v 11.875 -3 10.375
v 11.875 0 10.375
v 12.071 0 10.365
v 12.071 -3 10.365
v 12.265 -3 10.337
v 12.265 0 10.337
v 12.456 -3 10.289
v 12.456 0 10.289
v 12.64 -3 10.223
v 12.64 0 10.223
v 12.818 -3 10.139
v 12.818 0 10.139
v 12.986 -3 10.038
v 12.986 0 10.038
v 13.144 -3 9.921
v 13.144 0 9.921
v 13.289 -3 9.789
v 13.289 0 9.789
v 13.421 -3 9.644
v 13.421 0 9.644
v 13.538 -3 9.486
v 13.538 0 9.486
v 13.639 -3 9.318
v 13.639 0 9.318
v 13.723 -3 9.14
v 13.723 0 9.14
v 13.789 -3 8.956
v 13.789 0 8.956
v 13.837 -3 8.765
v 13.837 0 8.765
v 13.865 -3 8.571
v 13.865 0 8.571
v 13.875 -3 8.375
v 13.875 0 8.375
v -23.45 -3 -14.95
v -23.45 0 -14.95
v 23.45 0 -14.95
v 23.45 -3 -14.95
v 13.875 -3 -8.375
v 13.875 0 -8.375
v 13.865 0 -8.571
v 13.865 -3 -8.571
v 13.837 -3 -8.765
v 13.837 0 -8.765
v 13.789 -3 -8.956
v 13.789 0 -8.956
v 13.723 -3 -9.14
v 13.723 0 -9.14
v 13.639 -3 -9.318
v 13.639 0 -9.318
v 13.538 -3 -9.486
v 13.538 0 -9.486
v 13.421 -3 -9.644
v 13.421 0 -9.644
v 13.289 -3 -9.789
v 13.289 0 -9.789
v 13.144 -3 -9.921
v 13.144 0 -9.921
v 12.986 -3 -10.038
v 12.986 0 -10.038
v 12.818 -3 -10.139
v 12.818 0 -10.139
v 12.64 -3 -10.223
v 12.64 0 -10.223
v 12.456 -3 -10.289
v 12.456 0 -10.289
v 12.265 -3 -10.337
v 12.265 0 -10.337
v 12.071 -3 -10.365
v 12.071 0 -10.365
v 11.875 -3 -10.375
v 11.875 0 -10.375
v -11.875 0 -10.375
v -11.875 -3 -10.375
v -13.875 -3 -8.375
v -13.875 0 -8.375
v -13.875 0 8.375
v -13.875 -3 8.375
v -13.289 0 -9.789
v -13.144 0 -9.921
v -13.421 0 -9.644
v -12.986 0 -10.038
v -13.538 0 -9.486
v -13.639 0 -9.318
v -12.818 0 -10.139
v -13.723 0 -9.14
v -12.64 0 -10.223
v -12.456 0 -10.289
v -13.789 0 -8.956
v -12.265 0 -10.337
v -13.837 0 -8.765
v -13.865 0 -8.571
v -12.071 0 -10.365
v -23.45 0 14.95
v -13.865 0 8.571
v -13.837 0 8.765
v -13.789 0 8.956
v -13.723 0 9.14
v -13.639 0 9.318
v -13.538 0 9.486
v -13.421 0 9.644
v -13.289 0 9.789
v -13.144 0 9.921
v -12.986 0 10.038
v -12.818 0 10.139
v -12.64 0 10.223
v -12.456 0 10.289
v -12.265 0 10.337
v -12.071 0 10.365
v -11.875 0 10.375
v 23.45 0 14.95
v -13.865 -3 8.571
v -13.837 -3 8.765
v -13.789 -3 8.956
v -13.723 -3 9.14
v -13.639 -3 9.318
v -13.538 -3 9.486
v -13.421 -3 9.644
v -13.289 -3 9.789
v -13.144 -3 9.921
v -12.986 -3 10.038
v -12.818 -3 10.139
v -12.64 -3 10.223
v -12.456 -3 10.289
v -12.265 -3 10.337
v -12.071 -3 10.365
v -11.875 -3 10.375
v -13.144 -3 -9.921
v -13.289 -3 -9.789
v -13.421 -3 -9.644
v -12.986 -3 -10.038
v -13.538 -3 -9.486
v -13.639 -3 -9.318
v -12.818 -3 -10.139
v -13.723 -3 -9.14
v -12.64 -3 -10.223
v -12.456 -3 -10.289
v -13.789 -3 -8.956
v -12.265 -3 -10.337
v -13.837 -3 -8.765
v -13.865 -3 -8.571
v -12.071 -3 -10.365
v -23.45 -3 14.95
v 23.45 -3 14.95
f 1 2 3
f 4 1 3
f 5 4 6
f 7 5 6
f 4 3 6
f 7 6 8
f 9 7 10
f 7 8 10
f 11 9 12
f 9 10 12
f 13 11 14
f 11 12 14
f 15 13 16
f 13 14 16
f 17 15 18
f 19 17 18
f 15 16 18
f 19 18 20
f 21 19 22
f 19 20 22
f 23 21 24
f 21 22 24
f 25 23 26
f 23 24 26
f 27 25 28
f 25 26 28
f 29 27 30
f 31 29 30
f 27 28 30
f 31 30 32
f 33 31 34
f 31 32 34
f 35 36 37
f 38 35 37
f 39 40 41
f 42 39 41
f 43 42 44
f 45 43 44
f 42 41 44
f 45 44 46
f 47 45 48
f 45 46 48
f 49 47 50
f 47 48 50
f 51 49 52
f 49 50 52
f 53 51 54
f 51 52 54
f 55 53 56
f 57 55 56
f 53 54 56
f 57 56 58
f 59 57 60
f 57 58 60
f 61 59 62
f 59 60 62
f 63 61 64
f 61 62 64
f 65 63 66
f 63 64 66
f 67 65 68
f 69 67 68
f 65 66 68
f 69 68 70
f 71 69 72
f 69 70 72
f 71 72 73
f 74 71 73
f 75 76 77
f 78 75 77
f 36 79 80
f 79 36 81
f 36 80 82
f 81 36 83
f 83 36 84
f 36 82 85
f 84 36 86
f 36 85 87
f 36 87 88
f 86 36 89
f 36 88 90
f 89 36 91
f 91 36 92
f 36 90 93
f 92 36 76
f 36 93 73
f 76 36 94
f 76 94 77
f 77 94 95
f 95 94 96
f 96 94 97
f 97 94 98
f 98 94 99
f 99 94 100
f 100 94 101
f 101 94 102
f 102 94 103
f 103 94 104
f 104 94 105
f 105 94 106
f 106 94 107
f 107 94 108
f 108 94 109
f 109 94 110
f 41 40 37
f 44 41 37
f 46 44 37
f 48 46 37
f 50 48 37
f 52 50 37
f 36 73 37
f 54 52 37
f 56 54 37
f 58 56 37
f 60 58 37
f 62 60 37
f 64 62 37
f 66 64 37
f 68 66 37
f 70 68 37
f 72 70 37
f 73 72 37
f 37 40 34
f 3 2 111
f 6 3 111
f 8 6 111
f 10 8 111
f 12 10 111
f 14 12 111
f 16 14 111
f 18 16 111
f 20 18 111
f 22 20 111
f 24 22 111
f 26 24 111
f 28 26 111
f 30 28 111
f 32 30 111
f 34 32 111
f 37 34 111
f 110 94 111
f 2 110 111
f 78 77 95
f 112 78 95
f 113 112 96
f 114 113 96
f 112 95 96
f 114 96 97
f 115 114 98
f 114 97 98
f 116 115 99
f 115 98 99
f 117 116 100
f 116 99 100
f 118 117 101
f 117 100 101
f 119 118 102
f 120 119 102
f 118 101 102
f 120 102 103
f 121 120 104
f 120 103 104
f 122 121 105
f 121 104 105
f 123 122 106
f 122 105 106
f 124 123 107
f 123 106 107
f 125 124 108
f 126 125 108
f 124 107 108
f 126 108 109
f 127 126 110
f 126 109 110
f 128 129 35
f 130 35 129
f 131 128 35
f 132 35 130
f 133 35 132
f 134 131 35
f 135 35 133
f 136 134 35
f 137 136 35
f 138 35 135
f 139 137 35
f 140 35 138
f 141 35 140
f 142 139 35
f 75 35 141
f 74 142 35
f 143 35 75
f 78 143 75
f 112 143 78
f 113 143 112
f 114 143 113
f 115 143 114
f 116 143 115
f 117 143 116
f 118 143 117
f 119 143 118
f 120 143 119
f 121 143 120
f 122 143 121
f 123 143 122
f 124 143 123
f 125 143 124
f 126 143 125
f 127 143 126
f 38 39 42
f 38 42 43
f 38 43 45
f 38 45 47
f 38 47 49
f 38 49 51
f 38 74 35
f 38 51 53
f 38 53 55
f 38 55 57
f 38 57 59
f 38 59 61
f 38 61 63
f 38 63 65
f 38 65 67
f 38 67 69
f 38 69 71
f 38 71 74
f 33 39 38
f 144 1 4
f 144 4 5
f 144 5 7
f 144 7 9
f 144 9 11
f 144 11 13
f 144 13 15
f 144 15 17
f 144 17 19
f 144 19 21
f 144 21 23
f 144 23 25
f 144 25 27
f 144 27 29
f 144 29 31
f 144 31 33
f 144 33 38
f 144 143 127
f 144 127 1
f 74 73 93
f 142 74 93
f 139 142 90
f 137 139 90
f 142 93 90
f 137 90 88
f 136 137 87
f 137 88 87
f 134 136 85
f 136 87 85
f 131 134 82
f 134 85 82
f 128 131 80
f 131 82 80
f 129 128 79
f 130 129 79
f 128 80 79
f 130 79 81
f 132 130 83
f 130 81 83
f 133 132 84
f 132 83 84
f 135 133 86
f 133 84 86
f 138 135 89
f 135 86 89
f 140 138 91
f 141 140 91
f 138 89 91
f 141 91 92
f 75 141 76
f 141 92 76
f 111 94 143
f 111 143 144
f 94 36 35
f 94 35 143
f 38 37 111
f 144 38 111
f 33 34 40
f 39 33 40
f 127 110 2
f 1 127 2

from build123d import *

# Parameters (mm, degrees)
F0_W     = 46.9
F0_H     = 29.9
F1_DEPTH = 3


with BuildPart() as f1:
    # F0 (on Front) → F1 (new body)
    with BuildSketch(Plane.XZ):
        Rectangle(F0_W, F0_H)
        with BuildLine():
            Line((11.875, -10.375), (-11.875, -10.375))
            ThreePointArc((-11.875, -10.375), (-13.289214, -9.789214), (-13.875, -8.375))
            Line((-13.875, -8.375), (-13.875, 8.375))
            ThreePointArc((-13.875, 8.375), (-13.289214, 9.789214), (-11.875, 10.375))
            Line((-11.875, 10.375), (11.875, 10.375))
            ThreePointArc((11.875, 10.375), (13.289214, 9.789214), (13.875, 8.375))
            Line((13.875, 8.375), (13.875, -8.375))
            ThreePointArc((13.875, -8.375), (13.289214, -9.789214), (11.875, -10.375))
        make_face(mode=Mode.SUBTRACT)
    extrude(amount=F1_DEPTH)


solid = f1.part
